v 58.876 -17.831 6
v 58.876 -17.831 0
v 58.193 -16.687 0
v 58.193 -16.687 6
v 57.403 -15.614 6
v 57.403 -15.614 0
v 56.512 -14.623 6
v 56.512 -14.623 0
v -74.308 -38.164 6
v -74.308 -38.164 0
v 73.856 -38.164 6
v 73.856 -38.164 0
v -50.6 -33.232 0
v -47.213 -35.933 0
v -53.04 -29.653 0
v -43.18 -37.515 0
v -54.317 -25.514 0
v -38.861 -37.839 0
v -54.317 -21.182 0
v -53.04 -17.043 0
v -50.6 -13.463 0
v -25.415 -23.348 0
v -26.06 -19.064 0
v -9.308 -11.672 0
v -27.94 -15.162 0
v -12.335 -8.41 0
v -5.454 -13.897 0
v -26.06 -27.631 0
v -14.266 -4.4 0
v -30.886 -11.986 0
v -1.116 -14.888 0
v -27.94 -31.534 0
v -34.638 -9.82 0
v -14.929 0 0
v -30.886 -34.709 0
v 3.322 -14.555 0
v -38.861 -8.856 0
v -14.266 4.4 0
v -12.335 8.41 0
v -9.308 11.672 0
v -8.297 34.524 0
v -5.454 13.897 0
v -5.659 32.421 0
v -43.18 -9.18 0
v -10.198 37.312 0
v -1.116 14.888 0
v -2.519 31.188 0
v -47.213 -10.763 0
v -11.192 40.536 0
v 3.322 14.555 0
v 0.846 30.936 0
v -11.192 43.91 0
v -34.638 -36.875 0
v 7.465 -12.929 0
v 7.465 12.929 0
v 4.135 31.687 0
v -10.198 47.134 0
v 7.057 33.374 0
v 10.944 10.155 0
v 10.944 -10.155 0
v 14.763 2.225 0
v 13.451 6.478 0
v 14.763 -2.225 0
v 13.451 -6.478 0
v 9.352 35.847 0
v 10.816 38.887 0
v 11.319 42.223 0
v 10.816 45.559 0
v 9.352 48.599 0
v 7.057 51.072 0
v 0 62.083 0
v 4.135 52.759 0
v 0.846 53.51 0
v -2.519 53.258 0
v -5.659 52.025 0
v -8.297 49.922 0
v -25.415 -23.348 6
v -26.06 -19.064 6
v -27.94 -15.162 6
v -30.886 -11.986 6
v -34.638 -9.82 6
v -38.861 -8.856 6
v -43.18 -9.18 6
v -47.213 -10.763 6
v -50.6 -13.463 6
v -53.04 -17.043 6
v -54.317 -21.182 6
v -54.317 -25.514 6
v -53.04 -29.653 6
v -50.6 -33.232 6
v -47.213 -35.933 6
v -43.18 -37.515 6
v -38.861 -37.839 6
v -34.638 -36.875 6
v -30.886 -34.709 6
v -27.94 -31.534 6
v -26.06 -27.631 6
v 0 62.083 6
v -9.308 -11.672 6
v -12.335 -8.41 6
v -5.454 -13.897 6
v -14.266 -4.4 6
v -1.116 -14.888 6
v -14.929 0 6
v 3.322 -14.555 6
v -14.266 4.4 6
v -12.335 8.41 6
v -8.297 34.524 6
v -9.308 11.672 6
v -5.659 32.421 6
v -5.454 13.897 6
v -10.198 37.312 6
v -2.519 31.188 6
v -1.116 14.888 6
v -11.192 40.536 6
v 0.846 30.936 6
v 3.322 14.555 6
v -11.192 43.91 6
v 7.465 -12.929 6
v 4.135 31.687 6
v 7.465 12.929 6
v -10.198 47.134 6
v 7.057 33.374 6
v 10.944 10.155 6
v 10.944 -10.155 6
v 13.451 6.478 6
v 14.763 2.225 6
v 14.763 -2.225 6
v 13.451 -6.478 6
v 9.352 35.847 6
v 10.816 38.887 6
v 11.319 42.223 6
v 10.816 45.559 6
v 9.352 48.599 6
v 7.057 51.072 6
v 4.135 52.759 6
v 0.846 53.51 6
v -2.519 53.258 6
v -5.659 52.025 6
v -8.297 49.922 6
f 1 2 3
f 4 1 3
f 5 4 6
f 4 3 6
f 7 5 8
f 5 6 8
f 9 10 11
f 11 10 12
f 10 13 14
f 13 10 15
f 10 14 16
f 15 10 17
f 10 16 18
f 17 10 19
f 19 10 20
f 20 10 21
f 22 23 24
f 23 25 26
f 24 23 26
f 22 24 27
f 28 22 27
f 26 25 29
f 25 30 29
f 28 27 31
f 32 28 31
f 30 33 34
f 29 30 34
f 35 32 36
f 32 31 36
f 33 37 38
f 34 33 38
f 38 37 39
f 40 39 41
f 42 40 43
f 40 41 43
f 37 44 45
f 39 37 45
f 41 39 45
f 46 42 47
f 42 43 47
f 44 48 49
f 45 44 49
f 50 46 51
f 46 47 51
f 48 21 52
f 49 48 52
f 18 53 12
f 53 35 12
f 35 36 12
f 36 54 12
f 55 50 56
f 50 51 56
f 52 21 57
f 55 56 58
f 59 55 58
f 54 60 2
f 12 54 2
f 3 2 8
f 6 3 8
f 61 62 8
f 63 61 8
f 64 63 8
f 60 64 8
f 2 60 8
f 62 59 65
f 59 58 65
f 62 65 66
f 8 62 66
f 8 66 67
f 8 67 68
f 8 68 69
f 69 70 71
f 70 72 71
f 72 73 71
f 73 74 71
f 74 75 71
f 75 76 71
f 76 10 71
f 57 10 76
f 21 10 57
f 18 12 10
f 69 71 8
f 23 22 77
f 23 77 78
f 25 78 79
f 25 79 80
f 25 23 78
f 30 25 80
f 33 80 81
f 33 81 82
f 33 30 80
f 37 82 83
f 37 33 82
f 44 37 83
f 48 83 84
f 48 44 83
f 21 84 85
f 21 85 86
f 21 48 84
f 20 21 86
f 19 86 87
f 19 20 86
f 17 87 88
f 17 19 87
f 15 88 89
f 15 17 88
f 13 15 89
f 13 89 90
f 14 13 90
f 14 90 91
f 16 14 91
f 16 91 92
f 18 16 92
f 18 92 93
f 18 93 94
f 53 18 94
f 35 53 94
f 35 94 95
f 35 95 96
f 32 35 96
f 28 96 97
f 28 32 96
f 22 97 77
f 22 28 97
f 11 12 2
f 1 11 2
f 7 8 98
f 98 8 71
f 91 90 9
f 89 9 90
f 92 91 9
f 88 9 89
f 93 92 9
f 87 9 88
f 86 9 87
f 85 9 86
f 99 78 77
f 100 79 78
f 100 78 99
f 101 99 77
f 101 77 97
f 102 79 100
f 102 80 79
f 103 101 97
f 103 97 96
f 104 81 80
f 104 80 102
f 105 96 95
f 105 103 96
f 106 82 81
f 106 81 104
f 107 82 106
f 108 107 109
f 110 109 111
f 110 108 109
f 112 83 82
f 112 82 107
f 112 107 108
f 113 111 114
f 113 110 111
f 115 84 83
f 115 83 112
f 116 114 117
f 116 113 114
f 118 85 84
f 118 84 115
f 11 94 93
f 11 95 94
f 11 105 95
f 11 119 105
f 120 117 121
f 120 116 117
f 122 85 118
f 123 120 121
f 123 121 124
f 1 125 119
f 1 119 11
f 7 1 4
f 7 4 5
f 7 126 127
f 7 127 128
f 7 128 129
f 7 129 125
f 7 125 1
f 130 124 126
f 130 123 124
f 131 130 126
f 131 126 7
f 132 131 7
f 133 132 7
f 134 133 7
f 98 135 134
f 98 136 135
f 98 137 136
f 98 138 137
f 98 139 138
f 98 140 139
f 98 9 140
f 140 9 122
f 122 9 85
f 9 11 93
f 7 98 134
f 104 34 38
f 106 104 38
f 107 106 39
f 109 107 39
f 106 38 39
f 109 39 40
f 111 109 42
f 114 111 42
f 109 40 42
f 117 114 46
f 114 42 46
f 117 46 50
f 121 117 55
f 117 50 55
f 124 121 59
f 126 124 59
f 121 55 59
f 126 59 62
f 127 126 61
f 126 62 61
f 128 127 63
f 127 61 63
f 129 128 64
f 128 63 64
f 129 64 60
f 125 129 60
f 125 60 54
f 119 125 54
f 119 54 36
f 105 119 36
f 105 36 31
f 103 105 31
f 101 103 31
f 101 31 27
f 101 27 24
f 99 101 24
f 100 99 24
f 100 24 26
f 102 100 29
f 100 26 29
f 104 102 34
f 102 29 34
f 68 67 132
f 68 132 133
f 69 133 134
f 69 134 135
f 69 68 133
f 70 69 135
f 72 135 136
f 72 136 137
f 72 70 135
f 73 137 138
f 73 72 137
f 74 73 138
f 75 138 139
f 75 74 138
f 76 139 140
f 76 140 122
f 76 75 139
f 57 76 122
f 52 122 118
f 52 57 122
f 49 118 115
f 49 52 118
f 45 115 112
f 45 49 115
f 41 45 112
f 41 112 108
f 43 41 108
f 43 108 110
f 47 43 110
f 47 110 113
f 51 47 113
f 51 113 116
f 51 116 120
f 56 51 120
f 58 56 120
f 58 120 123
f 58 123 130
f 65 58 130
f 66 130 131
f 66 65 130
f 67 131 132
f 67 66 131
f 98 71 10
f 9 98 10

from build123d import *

# Parameters (mm, degrees)
F0_R     = 14.5320210998
F0_R_2   = 11.3186574679
F1_DEPTH = 6


# Not quite as in the source:
# - the program builds the solid bodies; features that only make, move or delete a surface that nothing else refers to are left out


with BuildPart() as f1:
    # F0 (on Top) → F1 (new body)
    with BuildSketch(Plane.XY):
        with BuildLine():
            Line((0, 62.0833449066), (-46.019215806, 0))
            Line((-46.019215806, 0), (-74.3083804846, -38.1641872227))
            Line((-74.3083804846, -38.1641872227), (73.8562121987, -38.1641872227))
            Line((73.8562121987, -38.1641872227), (58.8761133365, -17.8311929182))
            ThreePointArc((58.8761133365, -17.8311929182), (60.0804416969, -20.9630848338), (60.4900211693, -24.2934599519))
            ThreePointArc((60.4900211693, -24.2934599519), (34.0337461373, -29.5218920802), (56.5122905135, -14.6226963362))
            Line((56.5122905135, -14.6226963362), (0, 62.0833449066))
        make_face()
        with Locations((-39.9468056858, -23.3477279544)):
            Circle(F0_R, mode=Mode.SUBTRACT)
        with BuildLine():
            ThreePointArc((14.9293226936, 0), (0, -14.9293226936), (-14.9293226936, 0))
            ThreePointArc((-14.9293226936, 0), (0, 14.9293226936), (14.9293226936, 0))
        make_face(mode=Mode.SUBTRACT)
        with Locations((0, 42.2229841352)):
            Circle(F0_R_2, mode=Mode.SUBTRACT)
        with BuildLine():
            ThreePointArc((58.8761133365, -17.8311929182), (57.8111056109, -16.140817186), (56.5122905135, -14.6226963362))
            Line((56.5122905135, -14.6226963362), (58.8761133365, -17.8311929182))
        make_face()
        with BuildLine():
            Line((58.8761133365, -17.8311929182), (56.5122905135, -14.6226963362))
            ThreePointArc((56.5122905135, -14.6226963362), (34.0337461373, -29.5218920802), (60.4900211693, -24.2934599519))
            ThreePointArc((60.4900211693, -24.2934599519), (60.0804416969, -20.9630848338), (58.8761133365, -17.8311929182))
        make_face()
    extrude(amount=F1_DEPTH)


solid = f1.part
